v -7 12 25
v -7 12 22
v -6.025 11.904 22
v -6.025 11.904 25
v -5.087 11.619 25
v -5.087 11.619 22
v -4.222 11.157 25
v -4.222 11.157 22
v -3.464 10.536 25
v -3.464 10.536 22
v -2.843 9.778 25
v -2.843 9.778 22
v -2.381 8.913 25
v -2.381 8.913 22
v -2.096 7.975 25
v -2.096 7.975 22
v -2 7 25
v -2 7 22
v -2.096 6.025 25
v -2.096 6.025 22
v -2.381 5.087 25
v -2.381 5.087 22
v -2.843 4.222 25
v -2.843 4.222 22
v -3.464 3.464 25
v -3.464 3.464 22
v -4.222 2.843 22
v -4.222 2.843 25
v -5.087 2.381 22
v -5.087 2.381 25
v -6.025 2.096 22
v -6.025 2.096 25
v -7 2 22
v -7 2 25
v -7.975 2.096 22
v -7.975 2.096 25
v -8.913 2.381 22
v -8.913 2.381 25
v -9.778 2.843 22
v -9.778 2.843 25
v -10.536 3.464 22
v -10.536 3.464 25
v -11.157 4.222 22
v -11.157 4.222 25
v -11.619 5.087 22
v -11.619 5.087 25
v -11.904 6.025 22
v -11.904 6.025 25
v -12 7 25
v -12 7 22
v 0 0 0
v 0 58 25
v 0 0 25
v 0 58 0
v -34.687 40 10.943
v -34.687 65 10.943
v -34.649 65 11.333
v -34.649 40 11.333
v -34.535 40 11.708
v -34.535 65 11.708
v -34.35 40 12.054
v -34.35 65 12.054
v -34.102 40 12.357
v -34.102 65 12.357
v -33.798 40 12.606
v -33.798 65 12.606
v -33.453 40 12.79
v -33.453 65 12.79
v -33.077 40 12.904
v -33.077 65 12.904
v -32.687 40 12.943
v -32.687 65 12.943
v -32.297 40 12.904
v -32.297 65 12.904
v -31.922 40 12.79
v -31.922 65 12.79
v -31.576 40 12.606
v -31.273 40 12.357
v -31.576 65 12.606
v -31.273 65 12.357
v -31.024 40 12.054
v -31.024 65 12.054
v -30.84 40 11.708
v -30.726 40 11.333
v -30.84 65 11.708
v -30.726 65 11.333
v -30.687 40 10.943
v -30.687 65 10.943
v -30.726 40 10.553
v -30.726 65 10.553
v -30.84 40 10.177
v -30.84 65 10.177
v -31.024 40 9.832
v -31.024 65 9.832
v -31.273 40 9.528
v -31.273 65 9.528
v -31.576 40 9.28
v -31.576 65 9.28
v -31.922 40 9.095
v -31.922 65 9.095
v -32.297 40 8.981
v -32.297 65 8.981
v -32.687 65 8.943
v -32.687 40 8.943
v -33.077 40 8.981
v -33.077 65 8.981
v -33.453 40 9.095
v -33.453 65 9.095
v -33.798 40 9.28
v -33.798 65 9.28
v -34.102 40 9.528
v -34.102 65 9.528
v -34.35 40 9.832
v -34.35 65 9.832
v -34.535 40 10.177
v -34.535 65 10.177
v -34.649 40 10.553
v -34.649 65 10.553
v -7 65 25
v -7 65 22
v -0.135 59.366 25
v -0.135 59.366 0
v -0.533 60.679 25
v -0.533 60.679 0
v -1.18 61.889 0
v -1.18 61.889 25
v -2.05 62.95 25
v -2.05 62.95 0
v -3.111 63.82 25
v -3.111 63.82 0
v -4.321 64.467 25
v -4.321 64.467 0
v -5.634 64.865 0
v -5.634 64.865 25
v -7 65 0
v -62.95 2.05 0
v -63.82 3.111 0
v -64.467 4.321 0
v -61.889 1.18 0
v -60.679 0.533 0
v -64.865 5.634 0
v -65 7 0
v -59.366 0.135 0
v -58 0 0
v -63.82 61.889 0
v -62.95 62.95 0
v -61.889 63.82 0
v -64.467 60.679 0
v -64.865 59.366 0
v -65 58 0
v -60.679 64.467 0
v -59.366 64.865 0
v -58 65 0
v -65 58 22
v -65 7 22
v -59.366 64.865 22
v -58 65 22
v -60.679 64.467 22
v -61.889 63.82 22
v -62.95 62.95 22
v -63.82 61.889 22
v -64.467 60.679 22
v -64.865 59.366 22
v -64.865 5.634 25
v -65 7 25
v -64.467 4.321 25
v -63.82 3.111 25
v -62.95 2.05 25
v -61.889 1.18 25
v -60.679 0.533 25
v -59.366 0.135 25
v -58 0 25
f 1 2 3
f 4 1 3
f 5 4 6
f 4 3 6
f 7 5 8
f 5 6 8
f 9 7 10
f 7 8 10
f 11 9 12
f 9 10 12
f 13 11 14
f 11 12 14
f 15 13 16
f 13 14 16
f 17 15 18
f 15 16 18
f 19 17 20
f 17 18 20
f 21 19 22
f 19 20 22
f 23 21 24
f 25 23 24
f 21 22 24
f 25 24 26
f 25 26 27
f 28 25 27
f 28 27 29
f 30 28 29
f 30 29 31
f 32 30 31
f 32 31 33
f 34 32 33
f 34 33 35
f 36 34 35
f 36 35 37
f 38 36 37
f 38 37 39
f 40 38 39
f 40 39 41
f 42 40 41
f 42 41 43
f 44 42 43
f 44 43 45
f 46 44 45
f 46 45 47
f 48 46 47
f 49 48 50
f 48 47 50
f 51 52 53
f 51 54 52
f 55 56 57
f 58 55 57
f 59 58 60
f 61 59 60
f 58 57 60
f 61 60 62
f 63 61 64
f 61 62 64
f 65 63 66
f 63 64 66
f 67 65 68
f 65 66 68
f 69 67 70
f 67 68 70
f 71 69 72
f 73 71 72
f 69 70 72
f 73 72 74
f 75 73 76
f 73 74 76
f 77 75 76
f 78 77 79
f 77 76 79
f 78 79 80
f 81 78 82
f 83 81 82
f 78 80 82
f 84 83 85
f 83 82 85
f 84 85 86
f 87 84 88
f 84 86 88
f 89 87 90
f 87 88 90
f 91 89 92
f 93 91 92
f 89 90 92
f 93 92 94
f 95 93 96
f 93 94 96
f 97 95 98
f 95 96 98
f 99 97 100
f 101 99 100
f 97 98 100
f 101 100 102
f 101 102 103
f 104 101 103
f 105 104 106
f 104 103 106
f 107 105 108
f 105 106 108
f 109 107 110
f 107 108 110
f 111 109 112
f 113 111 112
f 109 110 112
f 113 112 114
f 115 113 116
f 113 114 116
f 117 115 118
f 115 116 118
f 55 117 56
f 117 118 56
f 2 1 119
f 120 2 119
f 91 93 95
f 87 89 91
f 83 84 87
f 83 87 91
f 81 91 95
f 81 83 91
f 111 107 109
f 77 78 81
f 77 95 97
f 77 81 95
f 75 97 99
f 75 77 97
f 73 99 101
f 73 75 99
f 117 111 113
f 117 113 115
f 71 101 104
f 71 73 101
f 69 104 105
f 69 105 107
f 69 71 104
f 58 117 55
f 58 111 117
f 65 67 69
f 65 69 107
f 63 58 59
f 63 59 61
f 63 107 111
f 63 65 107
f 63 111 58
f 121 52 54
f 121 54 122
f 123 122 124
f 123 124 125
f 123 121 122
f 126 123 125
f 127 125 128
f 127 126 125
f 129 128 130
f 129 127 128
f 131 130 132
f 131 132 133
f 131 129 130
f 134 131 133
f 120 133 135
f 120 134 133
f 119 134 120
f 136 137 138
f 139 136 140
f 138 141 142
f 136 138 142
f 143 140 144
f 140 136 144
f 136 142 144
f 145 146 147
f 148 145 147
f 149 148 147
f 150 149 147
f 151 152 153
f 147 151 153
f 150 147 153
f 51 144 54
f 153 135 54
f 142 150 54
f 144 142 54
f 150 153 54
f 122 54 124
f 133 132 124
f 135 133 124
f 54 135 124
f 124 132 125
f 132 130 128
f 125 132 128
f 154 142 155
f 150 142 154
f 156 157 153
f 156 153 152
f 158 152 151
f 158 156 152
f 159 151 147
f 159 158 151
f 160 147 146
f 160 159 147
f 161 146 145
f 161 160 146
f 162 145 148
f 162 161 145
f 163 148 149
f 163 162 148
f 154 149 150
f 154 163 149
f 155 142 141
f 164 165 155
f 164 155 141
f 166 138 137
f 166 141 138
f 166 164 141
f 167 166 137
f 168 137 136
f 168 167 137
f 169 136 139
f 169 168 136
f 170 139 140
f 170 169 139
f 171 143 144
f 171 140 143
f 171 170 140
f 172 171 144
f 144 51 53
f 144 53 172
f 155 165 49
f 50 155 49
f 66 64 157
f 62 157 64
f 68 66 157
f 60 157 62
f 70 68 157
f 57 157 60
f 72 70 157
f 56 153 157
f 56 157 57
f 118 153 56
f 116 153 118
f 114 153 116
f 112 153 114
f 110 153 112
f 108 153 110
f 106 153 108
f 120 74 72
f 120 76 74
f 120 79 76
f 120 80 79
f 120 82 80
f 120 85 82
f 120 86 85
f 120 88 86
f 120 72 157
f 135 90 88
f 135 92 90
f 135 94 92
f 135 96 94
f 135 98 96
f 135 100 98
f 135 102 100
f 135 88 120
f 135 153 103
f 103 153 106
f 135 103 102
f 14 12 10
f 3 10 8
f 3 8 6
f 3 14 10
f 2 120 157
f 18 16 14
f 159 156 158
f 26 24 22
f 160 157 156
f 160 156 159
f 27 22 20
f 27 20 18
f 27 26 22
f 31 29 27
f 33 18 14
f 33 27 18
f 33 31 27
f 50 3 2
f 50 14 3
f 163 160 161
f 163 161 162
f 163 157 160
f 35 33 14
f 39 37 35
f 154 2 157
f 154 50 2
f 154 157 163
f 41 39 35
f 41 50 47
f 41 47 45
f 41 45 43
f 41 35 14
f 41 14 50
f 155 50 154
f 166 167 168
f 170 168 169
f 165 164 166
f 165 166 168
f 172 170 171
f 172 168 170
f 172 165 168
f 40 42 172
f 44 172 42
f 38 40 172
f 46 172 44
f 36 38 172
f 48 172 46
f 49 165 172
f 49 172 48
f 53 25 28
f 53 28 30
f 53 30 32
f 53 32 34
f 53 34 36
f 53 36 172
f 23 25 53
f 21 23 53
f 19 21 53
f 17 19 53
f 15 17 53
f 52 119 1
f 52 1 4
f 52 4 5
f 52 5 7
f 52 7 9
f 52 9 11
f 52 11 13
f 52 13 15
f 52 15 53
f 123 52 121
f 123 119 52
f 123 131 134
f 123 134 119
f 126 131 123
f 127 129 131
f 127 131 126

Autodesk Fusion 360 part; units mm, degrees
sketch "Sketch1" plane through (0, 0, 0) normal (0, 0, 1) x (1, 0, 0)
  line L0 (0, 0) -> (-65, 0)
  line L1 (-65, 0) -> (-65, 65)
  line L2 (-65, 65) -> (0, 65)
  line L3 (0, 65) -> (0, 0)
  dimension "d1" = 65
  dimension "d2" = 65
extrude "Extrude1" add sketch "Sketch1" along normal blind 25
sketch "Sketch2" plane through (0, 0, 25) normal (0, 0, 1) x (-1, 0, 0)
  line L0 (0, -65) -> (65, -65)
  line L1 (65, -65) -> (65, 0)
  line L2 (65, 0) -> (0, 0)
  line L3 (0, 0) -> (0, -65)
  line L4 (0, 0) -> (65, 0)
  line L5 (65, 0) -> (65, -7)
  line L6 (65, -7) -> (0, -7)
  line L7 (0, -7) -> (0, 0)
  line L8 (0, 0) -> (7, 0)
  line L9 (7, 0) -> (7, -65)
  line L10 (7, -65) -> (0, -65)
  line L11 (0, -65) -> (0, 0)
  dimension "d5" = 65
  dimension "d6" = 7
  dimension "d7" = 7
fillet "Fillet1" radius 7 1 edges at (-65, 0, 12.5)
fillet "Fillet2" radius 7 1 edges at (0, 65, 12.5)
fillet "Fillet3" radius 7 1 edges at (-65, 65, 12.5)
extrude "Extrude2" cut sketch "Sketch2" against normal blind 3 contours L0 L1 L6 L9
sketch "Sketch3" plane through (0, 0, 22) normal (0, 0, 1) x (-1, 0, 0)
  arc A0 (58, -65) -> (65, -58) centre (58, -58) ccw
  line L0 (65, -58) -> (65, -7)
  line L1 (65, -7) -> (7, -7)
  line L2 (7, -7) -> (7, -65)
  line L3 (7, -65) -> (58, -65)
  circle A1 centre (7, -7) radius 5
  dimension "d13" = 10
extrude "Extrude3" cut sketch "Sketch3" along normal blind 3 contours L1 L2 A1 | L1 L2 A1
sketch "Sketch4" plane through (0, 65, 0) normal (0, 1, 0) x (-1, 0, 0)
  line L0 (58, 22) -> (7, 22)
  line L1 (7, 22) -> (7, 0)
  line L2 (7, 0) -> (58, 0)
  line L3 (58, 0) -> (58, 22)
  circle A0 centre (32.6873, 10.9427) radius 2
  dimension "d16" = 4
extrude "Extrude4" cut sketch "Sketch4" against normal blind 25 contours A0
